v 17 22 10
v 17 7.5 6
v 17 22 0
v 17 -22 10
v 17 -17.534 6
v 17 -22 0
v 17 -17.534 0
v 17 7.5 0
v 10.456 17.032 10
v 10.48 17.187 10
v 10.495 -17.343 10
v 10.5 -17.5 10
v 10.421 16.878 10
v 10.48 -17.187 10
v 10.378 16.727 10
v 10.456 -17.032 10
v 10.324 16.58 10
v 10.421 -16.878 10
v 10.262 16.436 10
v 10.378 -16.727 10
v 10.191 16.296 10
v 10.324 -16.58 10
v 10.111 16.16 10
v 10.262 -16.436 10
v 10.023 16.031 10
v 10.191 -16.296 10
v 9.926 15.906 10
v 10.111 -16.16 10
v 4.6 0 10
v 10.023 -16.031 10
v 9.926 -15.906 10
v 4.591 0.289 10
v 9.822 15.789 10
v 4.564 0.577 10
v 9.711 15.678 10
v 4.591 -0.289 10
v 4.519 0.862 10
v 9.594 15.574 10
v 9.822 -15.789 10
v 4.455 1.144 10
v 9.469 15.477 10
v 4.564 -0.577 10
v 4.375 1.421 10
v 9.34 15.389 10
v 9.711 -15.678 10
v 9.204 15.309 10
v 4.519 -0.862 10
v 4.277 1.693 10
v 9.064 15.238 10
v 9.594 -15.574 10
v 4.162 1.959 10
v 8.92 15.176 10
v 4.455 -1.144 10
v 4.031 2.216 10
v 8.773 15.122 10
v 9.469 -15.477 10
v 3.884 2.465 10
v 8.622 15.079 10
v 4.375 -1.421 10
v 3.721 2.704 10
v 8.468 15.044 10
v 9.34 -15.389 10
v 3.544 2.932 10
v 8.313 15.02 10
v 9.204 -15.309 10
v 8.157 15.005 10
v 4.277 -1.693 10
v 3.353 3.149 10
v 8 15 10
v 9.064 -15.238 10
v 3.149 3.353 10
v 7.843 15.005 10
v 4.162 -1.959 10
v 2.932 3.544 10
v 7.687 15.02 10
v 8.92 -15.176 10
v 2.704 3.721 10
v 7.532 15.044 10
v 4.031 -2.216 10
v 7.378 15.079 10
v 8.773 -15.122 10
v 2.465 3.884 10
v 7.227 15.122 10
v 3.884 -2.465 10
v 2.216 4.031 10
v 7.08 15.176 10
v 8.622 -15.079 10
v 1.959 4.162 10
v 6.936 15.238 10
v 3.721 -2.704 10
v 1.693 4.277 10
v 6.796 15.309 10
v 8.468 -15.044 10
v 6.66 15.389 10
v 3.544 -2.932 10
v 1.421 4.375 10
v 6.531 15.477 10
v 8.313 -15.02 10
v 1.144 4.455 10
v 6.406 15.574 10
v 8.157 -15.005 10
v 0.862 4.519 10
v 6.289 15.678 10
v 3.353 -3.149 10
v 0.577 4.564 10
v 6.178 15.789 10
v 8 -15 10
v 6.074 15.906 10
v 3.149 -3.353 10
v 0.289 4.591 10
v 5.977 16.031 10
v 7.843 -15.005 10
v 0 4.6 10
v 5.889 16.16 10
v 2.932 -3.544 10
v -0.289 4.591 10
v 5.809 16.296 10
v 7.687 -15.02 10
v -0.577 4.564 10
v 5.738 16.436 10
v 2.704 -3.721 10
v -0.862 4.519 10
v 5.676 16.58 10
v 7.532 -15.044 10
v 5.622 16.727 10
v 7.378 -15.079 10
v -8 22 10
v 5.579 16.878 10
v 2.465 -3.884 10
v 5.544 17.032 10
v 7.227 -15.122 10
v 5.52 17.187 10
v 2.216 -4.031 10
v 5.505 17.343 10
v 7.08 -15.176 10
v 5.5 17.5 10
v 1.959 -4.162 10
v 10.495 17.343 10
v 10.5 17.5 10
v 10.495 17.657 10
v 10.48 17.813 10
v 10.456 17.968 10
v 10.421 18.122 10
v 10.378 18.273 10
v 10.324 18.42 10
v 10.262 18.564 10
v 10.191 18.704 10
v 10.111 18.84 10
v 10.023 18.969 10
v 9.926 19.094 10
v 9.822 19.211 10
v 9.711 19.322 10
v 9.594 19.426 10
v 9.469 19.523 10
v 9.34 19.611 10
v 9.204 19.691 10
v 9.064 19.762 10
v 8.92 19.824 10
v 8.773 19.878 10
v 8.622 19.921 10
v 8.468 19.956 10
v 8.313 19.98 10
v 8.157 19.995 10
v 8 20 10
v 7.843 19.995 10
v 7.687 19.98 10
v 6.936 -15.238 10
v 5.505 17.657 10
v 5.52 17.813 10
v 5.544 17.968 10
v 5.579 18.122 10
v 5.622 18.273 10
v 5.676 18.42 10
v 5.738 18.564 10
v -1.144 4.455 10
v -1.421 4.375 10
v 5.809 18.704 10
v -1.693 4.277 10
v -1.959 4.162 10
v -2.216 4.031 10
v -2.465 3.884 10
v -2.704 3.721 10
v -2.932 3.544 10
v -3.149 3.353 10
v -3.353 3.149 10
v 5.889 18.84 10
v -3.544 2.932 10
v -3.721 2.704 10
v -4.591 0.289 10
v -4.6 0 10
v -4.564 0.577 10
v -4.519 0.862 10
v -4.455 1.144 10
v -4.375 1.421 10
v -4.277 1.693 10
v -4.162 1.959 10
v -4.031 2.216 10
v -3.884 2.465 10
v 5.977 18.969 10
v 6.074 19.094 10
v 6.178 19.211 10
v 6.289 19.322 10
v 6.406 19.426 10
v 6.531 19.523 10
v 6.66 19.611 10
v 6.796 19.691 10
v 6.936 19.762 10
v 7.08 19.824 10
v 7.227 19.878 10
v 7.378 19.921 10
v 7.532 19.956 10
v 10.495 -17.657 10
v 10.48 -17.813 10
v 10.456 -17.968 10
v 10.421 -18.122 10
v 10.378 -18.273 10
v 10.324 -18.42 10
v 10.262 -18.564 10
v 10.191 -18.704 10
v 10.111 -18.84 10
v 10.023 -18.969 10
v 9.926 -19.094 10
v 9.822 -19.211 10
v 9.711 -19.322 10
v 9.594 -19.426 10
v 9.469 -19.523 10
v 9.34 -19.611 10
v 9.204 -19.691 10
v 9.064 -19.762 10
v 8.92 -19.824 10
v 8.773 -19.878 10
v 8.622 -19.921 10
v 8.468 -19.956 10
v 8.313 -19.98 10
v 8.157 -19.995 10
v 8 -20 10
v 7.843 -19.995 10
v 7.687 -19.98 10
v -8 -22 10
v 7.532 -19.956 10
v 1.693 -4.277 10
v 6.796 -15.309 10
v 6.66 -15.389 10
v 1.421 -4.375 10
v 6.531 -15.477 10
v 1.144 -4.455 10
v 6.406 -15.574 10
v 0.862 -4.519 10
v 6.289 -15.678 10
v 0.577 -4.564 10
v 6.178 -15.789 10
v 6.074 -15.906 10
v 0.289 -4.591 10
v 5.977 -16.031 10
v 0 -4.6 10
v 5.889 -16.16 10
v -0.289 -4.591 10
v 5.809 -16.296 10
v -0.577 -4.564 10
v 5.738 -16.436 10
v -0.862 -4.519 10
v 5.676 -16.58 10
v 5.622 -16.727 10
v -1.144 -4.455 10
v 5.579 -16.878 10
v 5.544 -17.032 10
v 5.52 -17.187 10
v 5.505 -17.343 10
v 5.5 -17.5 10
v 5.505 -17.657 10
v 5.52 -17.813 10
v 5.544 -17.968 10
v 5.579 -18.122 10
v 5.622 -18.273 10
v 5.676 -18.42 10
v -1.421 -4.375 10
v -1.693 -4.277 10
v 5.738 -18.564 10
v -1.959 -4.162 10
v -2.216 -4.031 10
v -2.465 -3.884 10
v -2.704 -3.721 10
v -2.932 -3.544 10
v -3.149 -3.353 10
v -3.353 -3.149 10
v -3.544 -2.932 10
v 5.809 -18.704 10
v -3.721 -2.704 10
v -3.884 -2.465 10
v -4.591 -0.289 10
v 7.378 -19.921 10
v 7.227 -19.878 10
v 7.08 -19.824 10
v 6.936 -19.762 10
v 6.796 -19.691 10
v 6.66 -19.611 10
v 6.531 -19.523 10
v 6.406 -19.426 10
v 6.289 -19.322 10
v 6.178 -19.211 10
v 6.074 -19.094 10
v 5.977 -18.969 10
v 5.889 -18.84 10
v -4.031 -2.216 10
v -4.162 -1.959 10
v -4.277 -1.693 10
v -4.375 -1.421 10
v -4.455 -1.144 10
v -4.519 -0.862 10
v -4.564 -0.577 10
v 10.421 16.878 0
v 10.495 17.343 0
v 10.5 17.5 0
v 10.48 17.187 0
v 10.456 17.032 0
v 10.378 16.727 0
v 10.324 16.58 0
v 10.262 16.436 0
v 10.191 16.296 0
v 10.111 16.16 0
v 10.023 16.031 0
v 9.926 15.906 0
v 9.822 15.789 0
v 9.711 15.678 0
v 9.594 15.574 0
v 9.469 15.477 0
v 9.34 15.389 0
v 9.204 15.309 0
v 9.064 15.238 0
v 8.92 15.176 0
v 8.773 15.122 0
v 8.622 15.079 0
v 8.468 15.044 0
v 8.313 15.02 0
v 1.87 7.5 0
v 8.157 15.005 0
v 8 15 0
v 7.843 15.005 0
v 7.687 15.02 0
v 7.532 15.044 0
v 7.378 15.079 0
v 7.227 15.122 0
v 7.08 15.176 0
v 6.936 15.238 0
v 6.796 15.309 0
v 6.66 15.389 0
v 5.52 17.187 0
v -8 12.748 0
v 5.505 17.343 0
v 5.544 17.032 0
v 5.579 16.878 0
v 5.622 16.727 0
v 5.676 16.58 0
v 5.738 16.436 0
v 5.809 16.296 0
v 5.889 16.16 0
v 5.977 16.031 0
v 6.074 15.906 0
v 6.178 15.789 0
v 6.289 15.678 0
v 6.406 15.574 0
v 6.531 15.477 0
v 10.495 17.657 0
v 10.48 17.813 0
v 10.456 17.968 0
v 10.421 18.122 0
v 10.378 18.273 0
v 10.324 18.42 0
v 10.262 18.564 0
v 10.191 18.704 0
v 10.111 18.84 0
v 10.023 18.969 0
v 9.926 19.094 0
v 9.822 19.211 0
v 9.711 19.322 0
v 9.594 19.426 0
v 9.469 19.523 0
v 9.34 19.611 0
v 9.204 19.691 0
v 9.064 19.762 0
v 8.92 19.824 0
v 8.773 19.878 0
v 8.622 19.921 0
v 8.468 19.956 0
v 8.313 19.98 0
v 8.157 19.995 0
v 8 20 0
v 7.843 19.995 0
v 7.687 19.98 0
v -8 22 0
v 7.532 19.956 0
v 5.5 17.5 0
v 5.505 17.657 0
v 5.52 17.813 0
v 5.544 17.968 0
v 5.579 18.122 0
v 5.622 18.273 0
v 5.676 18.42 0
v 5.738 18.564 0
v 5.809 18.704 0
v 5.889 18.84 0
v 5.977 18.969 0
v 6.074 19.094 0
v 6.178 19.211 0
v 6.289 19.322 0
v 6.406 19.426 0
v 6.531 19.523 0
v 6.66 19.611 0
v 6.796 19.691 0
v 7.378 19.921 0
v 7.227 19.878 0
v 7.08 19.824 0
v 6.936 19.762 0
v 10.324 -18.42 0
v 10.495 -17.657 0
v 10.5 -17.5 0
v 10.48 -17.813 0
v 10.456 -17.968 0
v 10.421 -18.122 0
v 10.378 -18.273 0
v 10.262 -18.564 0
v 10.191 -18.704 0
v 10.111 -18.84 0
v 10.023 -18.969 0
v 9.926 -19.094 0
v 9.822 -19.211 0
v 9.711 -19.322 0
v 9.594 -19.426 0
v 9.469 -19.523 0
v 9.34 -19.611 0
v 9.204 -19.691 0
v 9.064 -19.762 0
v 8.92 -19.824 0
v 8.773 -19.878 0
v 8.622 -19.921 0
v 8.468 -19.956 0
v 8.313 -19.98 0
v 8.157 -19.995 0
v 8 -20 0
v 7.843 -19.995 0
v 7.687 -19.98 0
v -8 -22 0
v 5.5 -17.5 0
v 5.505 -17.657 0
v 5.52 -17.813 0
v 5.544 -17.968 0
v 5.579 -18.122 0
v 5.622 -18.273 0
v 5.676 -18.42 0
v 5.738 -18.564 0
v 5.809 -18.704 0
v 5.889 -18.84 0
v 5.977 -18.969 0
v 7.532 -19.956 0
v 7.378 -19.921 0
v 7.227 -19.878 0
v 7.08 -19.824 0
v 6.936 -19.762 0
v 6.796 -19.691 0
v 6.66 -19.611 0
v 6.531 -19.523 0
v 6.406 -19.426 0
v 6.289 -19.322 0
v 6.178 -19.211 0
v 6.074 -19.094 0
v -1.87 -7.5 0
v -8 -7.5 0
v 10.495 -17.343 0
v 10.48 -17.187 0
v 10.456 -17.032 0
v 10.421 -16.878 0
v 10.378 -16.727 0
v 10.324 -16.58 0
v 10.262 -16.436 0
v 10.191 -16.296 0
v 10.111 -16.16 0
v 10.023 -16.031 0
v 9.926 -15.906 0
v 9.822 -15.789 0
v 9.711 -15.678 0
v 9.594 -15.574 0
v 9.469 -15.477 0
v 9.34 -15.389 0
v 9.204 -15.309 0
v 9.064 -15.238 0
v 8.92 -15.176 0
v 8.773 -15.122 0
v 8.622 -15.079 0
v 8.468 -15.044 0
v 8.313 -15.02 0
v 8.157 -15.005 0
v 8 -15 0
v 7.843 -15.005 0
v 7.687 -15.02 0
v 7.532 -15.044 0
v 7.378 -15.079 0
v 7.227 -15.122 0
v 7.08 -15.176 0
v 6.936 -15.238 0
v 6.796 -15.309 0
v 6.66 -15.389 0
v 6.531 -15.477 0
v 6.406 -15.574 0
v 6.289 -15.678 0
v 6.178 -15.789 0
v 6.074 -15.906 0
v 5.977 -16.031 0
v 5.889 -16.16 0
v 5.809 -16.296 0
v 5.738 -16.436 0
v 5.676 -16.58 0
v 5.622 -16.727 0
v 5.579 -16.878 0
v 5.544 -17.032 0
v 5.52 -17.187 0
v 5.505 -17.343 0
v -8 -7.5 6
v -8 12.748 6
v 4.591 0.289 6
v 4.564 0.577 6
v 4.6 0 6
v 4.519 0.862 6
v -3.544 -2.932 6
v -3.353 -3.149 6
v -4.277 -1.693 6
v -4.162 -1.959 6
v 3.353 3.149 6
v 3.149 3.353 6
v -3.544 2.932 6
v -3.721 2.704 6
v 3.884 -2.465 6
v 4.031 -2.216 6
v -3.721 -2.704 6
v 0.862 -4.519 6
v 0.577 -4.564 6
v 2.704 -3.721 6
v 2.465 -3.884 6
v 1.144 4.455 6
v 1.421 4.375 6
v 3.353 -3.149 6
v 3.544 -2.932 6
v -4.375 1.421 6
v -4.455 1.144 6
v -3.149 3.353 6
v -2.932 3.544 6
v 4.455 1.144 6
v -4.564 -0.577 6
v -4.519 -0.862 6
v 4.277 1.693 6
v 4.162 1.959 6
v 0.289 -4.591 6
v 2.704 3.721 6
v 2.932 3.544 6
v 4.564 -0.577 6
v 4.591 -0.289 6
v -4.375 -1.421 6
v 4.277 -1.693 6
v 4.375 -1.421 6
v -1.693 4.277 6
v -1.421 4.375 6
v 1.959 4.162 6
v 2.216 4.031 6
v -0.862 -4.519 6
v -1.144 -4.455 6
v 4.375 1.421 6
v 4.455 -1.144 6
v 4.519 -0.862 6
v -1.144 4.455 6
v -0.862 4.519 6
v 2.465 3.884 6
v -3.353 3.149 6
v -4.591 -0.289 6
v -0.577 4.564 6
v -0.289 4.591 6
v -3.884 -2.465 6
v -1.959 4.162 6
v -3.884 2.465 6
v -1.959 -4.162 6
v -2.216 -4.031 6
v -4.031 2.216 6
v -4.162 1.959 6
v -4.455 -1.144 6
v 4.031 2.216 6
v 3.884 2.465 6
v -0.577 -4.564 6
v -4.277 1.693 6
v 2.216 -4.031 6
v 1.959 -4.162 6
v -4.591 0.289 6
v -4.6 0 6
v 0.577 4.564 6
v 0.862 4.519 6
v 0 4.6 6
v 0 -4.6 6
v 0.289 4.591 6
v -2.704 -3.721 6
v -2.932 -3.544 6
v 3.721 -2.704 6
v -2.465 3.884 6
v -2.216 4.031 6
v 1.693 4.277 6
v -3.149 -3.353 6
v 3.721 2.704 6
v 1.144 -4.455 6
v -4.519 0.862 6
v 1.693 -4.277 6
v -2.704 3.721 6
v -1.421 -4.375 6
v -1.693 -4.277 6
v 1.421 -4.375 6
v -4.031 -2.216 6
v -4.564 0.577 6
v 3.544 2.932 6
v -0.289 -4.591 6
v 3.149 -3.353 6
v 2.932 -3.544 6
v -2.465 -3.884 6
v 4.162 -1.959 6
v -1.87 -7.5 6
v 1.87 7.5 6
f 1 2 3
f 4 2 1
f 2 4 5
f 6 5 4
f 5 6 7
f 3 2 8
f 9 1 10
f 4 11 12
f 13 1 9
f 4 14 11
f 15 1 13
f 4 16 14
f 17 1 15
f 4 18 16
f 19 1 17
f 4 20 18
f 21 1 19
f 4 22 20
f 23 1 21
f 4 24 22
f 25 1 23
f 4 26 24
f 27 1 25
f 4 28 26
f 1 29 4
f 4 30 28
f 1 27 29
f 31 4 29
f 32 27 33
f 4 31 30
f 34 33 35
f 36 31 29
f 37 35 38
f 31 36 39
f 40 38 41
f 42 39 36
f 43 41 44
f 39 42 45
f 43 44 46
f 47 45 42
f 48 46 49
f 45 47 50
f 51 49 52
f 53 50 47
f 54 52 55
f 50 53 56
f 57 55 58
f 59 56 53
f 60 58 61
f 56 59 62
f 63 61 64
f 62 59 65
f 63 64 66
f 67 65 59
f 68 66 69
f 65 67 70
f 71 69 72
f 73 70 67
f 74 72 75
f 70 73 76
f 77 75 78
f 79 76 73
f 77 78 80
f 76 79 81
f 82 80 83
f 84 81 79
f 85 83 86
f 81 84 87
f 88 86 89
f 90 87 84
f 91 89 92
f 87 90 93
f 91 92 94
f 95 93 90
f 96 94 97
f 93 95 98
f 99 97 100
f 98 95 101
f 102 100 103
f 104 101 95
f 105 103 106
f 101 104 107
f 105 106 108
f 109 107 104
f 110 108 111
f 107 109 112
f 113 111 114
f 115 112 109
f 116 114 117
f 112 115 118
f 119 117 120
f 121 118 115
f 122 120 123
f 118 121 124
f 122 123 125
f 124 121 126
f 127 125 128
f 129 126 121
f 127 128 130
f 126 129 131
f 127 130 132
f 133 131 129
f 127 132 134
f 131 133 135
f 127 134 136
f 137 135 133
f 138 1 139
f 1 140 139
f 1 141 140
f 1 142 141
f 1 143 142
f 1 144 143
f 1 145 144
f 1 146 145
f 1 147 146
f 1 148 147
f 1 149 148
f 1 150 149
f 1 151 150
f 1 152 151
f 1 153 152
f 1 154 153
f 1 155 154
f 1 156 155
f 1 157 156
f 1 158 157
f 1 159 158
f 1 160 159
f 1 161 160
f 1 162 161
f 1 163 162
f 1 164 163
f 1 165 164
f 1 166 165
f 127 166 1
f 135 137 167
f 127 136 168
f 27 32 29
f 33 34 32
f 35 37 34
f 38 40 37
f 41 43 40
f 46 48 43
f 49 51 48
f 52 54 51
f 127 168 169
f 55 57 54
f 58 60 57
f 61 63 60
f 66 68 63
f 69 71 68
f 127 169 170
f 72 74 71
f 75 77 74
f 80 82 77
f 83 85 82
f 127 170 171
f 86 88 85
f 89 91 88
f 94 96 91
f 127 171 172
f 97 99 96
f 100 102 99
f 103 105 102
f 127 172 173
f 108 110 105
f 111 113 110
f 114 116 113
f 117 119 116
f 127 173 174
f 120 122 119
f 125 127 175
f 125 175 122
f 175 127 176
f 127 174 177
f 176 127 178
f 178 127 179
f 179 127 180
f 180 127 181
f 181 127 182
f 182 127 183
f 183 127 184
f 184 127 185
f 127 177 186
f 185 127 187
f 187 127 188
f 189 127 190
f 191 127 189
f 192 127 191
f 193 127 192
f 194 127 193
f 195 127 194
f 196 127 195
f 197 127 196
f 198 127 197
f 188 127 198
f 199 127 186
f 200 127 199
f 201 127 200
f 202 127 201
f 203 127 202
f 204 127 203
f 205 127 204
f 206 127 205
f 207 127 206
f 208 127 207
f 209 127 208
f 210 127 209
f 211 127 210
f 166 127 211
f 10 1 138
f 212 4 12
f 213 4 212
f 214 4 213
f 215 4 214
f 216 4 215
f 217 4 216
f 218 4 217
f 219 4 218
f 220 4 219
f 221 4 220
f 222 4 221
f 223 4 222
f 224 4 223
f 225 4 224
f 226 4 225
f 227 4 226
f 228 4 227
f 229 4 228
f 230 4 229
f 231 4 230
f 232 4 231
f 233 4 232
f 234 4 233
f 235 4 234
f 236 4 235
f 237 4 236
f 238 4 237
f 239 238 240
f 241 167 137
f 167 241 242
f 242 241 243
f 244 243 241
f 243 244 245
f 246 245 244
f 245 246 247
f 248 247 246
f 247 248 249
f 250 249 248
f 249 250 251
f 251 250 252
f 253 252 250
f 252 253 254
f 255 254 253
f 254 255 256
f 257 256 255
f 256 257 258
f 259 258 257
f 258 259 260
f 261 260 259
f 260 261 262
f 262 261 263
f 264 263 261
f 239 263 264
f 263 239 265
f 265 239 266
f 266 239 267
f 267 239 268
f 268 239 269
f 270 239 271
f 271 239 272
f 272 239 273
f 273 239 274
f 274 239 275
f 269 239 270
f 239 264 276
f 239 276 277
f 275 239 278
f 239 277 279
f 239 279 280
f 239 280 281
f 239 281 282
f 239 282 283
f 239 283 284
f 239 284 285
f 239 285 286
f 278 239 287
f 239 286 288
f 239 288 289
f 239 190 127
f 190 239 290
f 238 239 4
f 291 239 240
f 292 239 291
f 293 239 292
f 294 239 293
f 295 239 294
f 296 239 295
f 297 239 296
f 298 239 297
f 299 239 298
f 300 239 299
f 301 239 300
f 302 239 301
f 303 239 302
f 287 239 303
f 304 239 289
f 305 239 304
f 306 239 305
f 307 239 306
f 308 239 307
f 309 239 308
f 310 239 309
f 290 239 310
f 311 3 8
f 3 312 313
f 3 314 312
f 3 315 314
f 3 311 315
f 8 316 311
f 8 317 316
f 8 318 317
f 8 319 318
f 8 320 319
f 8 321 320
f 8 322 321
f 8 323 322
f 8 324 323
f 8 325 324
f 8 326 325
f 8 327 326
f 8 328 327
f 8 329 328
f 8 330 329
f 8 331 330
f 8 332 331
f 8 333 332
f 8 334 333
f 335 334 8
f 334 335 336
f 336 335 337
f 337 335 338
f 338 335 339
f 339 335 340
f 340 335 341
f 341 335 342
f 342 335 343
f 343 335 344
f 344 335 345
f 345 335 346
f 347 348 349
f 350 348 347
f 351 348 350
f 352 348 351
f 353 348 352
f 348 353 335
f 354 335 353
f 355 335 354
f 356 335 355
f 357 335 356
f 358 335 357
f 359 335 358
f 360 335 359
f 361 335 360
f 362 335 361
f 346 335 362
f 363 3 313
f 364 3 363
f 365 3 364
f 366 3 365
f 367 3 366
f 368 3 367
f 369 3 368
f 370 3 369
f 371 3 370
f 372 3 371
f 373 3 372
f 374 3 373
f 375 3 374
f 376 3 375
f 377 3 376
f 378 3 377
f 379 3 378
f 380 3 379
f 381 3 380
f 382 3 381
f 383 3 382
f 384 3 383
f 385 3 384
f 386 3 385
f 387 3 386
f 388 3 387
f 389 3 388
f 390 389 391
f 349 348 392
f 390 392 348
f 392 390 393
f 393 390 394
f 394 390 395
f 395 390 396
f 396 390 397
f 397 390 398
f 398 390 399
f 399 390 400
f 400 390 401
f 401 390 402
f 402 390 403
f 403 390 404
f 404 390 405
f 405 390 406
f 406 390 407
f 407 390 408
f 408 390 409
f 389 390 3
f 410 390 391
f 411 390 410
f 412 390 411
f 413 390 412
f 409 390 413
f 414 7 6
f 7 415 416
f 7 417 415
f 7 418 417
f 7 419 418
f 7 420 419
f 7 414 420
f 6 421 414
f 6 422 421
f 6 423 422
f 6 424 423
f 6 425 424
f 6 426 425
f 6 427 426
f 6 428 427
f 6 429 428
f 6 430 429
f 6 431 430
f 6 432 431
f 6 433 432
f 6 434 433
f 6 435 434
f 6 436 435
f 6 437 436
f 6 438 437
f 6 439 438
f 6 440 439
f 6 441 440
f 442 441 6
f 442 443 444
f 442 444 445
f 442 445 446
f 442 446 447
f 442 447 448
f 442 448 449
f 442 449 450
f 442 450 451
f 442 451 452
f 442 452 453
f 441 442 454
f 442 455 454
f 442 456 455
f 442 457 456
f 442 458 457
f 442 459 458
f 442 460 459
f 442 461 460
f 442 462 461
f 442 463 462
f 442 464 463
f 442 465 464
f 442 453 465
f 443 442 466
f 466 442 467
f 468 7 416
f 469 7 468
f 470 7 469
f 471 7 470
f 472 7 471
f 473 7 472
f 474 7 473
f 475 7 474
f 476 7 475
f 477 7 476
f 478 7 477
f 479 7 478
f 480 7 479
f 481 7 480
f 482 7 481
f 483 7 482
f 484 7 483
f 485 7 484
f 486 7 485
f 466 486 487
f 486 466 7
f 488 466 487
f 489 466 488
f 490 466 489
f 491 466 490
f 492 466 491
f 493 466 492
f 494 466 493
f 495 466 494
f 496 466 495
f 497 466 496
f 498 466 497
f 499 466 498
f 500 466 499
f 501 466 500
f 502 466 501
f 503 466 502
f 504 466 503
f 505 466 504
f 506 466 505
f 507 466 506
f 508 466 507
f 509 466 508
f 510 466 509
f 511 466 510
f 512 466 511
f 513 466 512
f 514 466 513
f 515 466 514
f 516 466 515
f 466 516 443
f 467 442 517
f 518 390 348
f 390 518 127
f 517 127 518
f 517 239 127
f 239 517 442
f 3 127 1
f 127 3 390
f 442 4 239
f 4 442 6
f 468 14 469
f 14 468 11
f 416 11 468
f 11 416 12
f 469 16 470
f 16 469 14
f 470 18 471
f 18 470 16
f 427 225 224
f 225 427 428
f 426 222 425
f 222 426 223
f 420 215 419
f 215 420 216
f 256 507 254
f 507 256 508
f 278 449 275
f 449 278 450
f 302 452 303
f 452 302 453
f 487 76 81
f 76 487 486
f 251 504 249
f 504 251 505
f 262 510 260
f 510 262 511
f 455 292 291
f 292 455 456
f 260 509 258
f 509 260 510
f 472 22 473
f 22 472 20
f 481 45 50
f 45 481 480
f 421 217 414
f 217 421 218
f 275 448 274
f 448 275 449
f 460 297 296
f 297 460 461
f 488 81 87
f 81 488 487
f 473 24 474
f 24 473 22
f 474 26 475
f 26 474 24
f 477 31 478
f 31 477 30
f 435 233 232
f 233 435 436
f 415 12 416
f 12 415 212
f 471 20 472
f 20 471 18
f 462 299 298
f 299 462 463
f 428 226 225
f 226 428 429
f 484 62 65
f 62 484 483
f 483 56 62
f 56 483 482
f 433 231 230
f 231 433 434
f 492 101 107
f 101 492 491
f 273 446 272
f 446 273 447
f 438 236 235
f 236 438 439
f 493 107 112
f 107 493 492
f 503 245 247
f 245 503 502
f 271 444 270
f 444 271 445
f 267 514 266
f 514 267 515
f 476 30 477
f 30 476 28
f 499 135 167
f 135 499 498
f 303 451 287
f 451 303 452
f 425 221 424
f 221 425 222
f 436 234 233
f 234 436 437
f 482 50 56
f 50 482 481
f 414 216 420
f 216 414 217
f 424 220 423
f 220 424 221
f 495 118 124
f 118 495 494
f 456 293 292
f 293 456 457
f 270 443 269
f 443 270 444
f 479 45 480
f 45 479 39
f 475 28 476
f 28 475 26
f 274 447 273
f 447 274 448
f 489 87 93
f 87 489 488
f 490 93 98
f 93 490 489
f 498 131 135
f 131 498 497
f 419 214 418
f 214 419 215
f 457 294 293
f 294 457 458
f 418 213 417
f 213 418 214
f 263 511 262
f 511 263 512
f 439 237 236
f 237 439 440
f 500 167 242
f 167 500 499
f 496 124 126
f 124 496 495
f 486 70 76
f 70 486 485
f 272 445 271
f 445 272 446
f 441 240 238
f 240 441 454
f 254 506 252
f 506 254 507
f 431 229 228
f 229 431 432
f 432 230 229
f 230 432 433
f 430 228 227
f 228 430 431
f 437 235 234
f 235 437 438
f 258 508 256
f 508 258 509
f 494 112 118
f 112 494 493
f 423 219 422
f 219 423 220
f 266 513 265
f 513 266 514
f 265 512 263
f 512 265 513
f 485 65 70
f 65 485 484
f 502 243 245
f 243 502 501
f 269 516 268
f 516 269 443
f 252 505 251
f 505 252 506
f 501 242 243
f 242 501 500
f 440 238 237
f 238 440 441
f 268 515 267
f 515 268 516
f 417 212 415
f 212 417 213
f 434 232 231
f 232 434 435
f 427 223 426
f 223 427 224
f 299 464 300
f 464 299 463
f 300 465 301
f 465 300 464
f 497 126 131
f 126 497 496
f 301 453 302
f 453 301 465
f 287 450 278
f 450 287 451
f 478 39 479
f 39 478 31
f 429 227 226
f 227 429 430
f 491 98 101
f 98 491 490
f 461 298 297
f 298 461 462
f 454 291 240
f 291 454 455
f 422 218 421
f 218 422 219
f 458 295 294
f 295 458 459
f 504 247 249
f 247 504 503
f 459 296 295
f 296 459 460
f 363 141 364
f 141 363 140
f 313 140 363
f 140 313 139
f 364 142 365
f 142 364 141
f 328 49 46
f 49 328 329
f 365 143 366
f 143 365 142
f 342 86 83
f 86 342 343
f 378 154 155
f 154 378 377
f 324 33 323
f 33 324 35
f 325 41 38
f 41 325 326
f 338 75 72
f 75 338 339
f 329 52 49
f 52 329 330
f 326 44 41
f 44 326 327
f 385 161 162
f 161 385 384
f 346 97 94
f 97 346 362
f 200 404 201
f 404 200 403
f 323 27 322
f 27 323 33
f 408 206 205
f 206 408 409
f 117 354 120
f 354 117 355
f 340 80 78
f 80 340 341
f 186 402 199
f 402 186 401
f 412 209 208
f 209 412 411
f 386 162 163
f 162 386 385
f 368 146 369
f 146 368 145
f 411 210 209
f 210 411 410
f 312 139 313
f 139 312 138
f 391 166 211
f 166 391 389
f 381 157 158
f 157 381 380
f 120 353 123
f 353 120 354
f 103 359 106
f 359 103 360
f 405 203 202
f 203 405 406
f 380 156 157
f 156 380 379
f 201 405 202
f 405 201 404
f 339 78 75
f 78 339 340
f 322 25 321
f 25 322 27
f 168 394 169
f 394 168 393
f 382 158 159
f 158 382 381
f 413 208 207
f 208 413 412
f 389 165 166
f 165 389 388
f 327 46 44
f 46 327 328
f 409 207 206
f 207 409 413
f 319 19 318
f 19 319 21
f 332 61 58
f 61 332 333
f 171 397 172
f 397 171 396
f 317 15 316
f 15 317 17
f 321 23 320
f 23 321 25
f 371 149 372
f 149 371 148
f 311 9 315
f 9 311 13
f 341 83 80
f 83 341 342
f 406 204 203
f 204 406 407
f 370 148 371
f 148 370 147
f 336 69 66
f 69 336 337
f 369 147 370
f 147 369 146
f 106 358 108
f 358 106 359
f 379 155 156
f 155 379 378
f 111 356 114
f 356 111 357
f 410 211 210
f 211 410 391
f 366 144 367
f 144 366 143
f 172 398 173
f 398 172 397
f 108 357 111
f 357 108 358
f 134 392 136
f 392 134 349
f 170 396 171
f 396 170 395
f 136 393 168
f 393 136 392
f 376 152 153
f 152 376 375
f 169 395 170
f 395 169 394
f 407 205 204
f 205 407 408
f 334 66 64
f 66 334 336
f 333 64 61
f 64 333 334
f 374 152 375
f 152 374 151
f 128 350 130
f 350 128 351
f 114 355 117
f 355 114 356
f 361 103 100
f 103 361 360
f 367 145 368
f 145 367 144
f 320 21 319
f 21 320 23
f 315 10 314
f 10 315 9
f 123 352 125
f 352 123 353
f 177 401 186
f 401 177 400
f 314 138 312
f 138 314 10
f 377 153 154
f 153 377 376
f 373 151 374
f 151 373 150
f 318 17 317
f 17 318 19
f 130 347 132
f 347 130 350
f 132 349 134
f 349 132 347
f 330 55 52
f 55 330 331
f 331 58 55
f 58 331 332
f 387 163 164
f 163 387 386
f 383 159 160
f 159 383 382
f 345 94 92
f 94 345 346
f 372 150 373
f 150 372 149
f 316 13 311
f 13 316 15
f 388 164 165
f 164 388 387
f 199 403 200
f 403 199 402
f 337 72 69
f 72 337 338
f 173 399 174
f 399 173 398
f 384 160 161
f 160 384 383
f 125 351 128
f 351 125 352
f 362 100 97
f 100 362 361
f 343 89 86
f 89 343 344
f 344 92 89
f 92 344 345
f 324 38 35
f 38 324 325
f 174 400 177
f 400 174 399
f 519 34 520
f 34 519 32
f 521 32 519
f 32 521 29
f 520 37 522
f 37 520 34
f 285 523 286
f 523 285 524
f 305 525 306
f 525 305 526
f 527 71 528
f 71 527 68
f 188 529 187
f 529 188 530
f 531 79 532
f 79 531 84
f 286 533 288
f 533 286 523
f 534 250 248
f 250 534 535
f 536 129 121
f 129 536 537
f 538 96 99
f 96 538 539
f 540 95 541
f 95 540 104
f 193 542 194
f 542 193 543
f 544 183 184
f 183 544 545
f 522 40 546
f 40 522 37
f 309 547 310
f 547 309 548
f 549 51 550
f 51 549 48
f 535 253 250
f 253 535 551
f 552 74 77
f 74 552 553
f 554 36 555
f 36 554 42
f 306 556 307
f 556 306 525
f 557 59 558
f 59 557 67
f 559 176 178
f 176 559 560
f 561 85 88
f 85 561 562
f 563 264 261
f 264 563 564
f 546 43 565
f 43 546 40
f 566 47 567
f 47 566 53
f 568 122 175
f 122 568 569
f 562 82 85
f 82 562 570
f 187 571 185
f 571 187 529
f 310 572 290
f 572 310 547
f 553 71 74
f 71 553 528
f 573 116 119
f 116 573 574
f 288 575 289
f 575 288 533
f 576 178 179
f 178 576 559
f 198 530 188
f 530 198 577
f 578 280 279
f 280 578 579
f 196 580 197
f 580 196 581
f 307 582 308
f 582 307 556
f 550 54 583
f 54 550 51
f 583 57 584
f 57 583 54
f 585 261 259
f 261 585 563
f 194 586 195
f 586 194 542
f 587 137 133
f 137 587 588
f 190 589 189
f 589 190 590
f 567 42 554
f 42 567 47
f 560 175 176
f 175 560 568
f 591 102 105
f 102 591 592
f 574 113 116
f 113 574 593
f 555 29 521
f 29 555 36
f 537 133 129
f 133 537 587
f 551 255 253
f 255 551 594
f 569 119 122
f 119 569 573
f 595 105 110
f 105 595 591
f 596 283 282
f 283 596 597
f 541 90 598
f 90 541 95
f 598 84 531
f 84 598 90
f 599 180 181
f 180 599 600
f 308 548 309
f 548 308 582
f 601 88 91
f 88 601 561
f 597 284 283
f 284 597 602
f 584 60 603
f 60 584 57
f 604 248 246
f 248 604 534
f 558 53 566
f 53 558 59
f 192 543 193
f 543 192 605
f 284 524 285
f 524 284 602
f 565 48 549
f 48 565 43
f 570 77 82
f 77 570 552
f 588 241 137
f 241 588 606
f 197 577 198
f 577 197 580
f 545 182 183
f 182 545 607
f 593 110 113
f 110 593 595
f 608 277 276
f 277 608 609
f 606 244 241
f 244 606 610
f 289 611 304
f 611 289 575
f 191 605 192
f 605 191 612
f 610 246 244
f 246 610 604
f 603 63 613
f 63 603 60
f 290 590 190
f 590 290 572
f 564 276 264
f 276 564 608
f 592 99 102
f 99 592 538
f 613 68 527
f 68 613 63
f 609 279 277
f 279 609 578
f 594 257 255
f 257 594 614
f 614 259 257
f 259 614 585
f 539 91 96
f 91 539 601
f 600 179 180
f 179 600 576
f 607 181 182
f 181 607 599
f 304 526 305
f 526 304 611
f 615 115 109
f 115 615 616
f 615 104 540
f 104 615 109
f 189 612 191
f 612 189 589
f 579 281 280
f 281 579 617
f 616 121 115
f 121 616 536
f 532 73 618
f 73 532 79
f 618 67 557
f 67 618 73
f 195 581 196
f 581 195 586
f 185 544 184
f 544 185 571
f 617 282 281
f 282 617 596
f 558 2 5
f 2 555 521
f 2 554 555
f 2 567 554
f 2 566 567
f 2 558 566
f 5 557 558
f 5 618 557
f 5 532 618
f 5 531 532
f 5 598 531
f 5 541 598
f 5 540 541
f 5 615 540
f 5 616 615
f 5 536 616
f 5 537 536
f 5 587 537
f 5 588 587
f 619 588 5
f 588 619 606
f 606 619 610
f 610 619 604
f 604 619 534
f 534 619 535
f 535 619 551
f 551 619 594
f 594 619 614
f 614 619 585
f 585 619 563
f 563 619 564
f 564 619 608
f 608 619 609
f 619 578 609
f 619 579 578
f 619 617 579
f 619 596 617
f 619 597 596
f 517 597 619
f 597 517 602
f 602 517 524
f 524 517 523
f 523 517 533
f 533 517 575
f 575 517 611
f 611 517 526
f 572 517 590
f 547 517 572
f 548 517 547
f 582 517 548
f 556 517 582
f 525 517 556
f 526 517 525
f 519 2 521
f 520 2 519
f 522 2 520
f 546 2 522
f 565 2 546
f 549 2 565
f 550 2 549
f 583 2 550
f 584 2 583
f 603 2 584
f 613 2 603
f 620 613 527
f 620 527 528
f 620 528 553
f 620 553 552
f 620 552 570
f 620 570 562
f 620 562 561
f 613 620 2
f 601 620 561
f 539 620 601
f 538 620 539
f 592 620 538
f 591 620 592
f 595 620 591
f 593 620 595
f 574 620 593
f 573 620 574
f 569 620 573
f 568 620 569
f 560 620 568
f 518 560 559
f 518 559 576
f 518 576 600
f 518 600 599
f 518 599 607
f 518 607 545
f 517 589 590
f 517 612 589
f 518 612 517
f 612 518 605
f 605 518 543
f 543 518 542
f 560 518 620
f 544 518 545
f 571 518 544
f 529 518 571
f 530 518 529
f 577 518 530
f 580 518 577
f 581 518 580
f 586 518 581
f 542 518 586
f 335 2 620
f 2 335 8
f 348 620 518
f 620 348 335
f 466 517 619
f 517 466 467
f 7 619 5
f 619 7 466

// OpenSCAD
$fa = 6;
$fs = 0.2;
$fn = 100;

offset_axe=8;
support_xp=17;
support_xm=8;
support_y=44;
support_h=10;
ep_plexi=6;
dia_inserts=5;
entraxe_inserts=35;
dia_centrage_axe=9.2;

module support_base() {
    difference() {
	translate([-support_xm-offset_axe, -support_y/2, 0]) 
	    cube([support_xp+support_xm, support_y, support_h]);
	translate([0, -entraxe_inserts/2, -1]) cylinder(d=dia_inserts, h=support_h+2);
	translate([0, entraxe_inserts/2, -1]) cylinder(d=dia_inserts, h=support_h+2);
	translate([-offset_axe, 0, -1]) cylinder(d=dia_centrage_axe, h=support_h+2);
    };
};

module support() {
    difference() {
        translate([offset_axe, 0, 0]) support_base();
        linear_extrude(height=ep_plexi) import(file="passage_bielles.dxf");
    };
};

support();
// projection(cut = true) translate([0,0,-1]) support();
